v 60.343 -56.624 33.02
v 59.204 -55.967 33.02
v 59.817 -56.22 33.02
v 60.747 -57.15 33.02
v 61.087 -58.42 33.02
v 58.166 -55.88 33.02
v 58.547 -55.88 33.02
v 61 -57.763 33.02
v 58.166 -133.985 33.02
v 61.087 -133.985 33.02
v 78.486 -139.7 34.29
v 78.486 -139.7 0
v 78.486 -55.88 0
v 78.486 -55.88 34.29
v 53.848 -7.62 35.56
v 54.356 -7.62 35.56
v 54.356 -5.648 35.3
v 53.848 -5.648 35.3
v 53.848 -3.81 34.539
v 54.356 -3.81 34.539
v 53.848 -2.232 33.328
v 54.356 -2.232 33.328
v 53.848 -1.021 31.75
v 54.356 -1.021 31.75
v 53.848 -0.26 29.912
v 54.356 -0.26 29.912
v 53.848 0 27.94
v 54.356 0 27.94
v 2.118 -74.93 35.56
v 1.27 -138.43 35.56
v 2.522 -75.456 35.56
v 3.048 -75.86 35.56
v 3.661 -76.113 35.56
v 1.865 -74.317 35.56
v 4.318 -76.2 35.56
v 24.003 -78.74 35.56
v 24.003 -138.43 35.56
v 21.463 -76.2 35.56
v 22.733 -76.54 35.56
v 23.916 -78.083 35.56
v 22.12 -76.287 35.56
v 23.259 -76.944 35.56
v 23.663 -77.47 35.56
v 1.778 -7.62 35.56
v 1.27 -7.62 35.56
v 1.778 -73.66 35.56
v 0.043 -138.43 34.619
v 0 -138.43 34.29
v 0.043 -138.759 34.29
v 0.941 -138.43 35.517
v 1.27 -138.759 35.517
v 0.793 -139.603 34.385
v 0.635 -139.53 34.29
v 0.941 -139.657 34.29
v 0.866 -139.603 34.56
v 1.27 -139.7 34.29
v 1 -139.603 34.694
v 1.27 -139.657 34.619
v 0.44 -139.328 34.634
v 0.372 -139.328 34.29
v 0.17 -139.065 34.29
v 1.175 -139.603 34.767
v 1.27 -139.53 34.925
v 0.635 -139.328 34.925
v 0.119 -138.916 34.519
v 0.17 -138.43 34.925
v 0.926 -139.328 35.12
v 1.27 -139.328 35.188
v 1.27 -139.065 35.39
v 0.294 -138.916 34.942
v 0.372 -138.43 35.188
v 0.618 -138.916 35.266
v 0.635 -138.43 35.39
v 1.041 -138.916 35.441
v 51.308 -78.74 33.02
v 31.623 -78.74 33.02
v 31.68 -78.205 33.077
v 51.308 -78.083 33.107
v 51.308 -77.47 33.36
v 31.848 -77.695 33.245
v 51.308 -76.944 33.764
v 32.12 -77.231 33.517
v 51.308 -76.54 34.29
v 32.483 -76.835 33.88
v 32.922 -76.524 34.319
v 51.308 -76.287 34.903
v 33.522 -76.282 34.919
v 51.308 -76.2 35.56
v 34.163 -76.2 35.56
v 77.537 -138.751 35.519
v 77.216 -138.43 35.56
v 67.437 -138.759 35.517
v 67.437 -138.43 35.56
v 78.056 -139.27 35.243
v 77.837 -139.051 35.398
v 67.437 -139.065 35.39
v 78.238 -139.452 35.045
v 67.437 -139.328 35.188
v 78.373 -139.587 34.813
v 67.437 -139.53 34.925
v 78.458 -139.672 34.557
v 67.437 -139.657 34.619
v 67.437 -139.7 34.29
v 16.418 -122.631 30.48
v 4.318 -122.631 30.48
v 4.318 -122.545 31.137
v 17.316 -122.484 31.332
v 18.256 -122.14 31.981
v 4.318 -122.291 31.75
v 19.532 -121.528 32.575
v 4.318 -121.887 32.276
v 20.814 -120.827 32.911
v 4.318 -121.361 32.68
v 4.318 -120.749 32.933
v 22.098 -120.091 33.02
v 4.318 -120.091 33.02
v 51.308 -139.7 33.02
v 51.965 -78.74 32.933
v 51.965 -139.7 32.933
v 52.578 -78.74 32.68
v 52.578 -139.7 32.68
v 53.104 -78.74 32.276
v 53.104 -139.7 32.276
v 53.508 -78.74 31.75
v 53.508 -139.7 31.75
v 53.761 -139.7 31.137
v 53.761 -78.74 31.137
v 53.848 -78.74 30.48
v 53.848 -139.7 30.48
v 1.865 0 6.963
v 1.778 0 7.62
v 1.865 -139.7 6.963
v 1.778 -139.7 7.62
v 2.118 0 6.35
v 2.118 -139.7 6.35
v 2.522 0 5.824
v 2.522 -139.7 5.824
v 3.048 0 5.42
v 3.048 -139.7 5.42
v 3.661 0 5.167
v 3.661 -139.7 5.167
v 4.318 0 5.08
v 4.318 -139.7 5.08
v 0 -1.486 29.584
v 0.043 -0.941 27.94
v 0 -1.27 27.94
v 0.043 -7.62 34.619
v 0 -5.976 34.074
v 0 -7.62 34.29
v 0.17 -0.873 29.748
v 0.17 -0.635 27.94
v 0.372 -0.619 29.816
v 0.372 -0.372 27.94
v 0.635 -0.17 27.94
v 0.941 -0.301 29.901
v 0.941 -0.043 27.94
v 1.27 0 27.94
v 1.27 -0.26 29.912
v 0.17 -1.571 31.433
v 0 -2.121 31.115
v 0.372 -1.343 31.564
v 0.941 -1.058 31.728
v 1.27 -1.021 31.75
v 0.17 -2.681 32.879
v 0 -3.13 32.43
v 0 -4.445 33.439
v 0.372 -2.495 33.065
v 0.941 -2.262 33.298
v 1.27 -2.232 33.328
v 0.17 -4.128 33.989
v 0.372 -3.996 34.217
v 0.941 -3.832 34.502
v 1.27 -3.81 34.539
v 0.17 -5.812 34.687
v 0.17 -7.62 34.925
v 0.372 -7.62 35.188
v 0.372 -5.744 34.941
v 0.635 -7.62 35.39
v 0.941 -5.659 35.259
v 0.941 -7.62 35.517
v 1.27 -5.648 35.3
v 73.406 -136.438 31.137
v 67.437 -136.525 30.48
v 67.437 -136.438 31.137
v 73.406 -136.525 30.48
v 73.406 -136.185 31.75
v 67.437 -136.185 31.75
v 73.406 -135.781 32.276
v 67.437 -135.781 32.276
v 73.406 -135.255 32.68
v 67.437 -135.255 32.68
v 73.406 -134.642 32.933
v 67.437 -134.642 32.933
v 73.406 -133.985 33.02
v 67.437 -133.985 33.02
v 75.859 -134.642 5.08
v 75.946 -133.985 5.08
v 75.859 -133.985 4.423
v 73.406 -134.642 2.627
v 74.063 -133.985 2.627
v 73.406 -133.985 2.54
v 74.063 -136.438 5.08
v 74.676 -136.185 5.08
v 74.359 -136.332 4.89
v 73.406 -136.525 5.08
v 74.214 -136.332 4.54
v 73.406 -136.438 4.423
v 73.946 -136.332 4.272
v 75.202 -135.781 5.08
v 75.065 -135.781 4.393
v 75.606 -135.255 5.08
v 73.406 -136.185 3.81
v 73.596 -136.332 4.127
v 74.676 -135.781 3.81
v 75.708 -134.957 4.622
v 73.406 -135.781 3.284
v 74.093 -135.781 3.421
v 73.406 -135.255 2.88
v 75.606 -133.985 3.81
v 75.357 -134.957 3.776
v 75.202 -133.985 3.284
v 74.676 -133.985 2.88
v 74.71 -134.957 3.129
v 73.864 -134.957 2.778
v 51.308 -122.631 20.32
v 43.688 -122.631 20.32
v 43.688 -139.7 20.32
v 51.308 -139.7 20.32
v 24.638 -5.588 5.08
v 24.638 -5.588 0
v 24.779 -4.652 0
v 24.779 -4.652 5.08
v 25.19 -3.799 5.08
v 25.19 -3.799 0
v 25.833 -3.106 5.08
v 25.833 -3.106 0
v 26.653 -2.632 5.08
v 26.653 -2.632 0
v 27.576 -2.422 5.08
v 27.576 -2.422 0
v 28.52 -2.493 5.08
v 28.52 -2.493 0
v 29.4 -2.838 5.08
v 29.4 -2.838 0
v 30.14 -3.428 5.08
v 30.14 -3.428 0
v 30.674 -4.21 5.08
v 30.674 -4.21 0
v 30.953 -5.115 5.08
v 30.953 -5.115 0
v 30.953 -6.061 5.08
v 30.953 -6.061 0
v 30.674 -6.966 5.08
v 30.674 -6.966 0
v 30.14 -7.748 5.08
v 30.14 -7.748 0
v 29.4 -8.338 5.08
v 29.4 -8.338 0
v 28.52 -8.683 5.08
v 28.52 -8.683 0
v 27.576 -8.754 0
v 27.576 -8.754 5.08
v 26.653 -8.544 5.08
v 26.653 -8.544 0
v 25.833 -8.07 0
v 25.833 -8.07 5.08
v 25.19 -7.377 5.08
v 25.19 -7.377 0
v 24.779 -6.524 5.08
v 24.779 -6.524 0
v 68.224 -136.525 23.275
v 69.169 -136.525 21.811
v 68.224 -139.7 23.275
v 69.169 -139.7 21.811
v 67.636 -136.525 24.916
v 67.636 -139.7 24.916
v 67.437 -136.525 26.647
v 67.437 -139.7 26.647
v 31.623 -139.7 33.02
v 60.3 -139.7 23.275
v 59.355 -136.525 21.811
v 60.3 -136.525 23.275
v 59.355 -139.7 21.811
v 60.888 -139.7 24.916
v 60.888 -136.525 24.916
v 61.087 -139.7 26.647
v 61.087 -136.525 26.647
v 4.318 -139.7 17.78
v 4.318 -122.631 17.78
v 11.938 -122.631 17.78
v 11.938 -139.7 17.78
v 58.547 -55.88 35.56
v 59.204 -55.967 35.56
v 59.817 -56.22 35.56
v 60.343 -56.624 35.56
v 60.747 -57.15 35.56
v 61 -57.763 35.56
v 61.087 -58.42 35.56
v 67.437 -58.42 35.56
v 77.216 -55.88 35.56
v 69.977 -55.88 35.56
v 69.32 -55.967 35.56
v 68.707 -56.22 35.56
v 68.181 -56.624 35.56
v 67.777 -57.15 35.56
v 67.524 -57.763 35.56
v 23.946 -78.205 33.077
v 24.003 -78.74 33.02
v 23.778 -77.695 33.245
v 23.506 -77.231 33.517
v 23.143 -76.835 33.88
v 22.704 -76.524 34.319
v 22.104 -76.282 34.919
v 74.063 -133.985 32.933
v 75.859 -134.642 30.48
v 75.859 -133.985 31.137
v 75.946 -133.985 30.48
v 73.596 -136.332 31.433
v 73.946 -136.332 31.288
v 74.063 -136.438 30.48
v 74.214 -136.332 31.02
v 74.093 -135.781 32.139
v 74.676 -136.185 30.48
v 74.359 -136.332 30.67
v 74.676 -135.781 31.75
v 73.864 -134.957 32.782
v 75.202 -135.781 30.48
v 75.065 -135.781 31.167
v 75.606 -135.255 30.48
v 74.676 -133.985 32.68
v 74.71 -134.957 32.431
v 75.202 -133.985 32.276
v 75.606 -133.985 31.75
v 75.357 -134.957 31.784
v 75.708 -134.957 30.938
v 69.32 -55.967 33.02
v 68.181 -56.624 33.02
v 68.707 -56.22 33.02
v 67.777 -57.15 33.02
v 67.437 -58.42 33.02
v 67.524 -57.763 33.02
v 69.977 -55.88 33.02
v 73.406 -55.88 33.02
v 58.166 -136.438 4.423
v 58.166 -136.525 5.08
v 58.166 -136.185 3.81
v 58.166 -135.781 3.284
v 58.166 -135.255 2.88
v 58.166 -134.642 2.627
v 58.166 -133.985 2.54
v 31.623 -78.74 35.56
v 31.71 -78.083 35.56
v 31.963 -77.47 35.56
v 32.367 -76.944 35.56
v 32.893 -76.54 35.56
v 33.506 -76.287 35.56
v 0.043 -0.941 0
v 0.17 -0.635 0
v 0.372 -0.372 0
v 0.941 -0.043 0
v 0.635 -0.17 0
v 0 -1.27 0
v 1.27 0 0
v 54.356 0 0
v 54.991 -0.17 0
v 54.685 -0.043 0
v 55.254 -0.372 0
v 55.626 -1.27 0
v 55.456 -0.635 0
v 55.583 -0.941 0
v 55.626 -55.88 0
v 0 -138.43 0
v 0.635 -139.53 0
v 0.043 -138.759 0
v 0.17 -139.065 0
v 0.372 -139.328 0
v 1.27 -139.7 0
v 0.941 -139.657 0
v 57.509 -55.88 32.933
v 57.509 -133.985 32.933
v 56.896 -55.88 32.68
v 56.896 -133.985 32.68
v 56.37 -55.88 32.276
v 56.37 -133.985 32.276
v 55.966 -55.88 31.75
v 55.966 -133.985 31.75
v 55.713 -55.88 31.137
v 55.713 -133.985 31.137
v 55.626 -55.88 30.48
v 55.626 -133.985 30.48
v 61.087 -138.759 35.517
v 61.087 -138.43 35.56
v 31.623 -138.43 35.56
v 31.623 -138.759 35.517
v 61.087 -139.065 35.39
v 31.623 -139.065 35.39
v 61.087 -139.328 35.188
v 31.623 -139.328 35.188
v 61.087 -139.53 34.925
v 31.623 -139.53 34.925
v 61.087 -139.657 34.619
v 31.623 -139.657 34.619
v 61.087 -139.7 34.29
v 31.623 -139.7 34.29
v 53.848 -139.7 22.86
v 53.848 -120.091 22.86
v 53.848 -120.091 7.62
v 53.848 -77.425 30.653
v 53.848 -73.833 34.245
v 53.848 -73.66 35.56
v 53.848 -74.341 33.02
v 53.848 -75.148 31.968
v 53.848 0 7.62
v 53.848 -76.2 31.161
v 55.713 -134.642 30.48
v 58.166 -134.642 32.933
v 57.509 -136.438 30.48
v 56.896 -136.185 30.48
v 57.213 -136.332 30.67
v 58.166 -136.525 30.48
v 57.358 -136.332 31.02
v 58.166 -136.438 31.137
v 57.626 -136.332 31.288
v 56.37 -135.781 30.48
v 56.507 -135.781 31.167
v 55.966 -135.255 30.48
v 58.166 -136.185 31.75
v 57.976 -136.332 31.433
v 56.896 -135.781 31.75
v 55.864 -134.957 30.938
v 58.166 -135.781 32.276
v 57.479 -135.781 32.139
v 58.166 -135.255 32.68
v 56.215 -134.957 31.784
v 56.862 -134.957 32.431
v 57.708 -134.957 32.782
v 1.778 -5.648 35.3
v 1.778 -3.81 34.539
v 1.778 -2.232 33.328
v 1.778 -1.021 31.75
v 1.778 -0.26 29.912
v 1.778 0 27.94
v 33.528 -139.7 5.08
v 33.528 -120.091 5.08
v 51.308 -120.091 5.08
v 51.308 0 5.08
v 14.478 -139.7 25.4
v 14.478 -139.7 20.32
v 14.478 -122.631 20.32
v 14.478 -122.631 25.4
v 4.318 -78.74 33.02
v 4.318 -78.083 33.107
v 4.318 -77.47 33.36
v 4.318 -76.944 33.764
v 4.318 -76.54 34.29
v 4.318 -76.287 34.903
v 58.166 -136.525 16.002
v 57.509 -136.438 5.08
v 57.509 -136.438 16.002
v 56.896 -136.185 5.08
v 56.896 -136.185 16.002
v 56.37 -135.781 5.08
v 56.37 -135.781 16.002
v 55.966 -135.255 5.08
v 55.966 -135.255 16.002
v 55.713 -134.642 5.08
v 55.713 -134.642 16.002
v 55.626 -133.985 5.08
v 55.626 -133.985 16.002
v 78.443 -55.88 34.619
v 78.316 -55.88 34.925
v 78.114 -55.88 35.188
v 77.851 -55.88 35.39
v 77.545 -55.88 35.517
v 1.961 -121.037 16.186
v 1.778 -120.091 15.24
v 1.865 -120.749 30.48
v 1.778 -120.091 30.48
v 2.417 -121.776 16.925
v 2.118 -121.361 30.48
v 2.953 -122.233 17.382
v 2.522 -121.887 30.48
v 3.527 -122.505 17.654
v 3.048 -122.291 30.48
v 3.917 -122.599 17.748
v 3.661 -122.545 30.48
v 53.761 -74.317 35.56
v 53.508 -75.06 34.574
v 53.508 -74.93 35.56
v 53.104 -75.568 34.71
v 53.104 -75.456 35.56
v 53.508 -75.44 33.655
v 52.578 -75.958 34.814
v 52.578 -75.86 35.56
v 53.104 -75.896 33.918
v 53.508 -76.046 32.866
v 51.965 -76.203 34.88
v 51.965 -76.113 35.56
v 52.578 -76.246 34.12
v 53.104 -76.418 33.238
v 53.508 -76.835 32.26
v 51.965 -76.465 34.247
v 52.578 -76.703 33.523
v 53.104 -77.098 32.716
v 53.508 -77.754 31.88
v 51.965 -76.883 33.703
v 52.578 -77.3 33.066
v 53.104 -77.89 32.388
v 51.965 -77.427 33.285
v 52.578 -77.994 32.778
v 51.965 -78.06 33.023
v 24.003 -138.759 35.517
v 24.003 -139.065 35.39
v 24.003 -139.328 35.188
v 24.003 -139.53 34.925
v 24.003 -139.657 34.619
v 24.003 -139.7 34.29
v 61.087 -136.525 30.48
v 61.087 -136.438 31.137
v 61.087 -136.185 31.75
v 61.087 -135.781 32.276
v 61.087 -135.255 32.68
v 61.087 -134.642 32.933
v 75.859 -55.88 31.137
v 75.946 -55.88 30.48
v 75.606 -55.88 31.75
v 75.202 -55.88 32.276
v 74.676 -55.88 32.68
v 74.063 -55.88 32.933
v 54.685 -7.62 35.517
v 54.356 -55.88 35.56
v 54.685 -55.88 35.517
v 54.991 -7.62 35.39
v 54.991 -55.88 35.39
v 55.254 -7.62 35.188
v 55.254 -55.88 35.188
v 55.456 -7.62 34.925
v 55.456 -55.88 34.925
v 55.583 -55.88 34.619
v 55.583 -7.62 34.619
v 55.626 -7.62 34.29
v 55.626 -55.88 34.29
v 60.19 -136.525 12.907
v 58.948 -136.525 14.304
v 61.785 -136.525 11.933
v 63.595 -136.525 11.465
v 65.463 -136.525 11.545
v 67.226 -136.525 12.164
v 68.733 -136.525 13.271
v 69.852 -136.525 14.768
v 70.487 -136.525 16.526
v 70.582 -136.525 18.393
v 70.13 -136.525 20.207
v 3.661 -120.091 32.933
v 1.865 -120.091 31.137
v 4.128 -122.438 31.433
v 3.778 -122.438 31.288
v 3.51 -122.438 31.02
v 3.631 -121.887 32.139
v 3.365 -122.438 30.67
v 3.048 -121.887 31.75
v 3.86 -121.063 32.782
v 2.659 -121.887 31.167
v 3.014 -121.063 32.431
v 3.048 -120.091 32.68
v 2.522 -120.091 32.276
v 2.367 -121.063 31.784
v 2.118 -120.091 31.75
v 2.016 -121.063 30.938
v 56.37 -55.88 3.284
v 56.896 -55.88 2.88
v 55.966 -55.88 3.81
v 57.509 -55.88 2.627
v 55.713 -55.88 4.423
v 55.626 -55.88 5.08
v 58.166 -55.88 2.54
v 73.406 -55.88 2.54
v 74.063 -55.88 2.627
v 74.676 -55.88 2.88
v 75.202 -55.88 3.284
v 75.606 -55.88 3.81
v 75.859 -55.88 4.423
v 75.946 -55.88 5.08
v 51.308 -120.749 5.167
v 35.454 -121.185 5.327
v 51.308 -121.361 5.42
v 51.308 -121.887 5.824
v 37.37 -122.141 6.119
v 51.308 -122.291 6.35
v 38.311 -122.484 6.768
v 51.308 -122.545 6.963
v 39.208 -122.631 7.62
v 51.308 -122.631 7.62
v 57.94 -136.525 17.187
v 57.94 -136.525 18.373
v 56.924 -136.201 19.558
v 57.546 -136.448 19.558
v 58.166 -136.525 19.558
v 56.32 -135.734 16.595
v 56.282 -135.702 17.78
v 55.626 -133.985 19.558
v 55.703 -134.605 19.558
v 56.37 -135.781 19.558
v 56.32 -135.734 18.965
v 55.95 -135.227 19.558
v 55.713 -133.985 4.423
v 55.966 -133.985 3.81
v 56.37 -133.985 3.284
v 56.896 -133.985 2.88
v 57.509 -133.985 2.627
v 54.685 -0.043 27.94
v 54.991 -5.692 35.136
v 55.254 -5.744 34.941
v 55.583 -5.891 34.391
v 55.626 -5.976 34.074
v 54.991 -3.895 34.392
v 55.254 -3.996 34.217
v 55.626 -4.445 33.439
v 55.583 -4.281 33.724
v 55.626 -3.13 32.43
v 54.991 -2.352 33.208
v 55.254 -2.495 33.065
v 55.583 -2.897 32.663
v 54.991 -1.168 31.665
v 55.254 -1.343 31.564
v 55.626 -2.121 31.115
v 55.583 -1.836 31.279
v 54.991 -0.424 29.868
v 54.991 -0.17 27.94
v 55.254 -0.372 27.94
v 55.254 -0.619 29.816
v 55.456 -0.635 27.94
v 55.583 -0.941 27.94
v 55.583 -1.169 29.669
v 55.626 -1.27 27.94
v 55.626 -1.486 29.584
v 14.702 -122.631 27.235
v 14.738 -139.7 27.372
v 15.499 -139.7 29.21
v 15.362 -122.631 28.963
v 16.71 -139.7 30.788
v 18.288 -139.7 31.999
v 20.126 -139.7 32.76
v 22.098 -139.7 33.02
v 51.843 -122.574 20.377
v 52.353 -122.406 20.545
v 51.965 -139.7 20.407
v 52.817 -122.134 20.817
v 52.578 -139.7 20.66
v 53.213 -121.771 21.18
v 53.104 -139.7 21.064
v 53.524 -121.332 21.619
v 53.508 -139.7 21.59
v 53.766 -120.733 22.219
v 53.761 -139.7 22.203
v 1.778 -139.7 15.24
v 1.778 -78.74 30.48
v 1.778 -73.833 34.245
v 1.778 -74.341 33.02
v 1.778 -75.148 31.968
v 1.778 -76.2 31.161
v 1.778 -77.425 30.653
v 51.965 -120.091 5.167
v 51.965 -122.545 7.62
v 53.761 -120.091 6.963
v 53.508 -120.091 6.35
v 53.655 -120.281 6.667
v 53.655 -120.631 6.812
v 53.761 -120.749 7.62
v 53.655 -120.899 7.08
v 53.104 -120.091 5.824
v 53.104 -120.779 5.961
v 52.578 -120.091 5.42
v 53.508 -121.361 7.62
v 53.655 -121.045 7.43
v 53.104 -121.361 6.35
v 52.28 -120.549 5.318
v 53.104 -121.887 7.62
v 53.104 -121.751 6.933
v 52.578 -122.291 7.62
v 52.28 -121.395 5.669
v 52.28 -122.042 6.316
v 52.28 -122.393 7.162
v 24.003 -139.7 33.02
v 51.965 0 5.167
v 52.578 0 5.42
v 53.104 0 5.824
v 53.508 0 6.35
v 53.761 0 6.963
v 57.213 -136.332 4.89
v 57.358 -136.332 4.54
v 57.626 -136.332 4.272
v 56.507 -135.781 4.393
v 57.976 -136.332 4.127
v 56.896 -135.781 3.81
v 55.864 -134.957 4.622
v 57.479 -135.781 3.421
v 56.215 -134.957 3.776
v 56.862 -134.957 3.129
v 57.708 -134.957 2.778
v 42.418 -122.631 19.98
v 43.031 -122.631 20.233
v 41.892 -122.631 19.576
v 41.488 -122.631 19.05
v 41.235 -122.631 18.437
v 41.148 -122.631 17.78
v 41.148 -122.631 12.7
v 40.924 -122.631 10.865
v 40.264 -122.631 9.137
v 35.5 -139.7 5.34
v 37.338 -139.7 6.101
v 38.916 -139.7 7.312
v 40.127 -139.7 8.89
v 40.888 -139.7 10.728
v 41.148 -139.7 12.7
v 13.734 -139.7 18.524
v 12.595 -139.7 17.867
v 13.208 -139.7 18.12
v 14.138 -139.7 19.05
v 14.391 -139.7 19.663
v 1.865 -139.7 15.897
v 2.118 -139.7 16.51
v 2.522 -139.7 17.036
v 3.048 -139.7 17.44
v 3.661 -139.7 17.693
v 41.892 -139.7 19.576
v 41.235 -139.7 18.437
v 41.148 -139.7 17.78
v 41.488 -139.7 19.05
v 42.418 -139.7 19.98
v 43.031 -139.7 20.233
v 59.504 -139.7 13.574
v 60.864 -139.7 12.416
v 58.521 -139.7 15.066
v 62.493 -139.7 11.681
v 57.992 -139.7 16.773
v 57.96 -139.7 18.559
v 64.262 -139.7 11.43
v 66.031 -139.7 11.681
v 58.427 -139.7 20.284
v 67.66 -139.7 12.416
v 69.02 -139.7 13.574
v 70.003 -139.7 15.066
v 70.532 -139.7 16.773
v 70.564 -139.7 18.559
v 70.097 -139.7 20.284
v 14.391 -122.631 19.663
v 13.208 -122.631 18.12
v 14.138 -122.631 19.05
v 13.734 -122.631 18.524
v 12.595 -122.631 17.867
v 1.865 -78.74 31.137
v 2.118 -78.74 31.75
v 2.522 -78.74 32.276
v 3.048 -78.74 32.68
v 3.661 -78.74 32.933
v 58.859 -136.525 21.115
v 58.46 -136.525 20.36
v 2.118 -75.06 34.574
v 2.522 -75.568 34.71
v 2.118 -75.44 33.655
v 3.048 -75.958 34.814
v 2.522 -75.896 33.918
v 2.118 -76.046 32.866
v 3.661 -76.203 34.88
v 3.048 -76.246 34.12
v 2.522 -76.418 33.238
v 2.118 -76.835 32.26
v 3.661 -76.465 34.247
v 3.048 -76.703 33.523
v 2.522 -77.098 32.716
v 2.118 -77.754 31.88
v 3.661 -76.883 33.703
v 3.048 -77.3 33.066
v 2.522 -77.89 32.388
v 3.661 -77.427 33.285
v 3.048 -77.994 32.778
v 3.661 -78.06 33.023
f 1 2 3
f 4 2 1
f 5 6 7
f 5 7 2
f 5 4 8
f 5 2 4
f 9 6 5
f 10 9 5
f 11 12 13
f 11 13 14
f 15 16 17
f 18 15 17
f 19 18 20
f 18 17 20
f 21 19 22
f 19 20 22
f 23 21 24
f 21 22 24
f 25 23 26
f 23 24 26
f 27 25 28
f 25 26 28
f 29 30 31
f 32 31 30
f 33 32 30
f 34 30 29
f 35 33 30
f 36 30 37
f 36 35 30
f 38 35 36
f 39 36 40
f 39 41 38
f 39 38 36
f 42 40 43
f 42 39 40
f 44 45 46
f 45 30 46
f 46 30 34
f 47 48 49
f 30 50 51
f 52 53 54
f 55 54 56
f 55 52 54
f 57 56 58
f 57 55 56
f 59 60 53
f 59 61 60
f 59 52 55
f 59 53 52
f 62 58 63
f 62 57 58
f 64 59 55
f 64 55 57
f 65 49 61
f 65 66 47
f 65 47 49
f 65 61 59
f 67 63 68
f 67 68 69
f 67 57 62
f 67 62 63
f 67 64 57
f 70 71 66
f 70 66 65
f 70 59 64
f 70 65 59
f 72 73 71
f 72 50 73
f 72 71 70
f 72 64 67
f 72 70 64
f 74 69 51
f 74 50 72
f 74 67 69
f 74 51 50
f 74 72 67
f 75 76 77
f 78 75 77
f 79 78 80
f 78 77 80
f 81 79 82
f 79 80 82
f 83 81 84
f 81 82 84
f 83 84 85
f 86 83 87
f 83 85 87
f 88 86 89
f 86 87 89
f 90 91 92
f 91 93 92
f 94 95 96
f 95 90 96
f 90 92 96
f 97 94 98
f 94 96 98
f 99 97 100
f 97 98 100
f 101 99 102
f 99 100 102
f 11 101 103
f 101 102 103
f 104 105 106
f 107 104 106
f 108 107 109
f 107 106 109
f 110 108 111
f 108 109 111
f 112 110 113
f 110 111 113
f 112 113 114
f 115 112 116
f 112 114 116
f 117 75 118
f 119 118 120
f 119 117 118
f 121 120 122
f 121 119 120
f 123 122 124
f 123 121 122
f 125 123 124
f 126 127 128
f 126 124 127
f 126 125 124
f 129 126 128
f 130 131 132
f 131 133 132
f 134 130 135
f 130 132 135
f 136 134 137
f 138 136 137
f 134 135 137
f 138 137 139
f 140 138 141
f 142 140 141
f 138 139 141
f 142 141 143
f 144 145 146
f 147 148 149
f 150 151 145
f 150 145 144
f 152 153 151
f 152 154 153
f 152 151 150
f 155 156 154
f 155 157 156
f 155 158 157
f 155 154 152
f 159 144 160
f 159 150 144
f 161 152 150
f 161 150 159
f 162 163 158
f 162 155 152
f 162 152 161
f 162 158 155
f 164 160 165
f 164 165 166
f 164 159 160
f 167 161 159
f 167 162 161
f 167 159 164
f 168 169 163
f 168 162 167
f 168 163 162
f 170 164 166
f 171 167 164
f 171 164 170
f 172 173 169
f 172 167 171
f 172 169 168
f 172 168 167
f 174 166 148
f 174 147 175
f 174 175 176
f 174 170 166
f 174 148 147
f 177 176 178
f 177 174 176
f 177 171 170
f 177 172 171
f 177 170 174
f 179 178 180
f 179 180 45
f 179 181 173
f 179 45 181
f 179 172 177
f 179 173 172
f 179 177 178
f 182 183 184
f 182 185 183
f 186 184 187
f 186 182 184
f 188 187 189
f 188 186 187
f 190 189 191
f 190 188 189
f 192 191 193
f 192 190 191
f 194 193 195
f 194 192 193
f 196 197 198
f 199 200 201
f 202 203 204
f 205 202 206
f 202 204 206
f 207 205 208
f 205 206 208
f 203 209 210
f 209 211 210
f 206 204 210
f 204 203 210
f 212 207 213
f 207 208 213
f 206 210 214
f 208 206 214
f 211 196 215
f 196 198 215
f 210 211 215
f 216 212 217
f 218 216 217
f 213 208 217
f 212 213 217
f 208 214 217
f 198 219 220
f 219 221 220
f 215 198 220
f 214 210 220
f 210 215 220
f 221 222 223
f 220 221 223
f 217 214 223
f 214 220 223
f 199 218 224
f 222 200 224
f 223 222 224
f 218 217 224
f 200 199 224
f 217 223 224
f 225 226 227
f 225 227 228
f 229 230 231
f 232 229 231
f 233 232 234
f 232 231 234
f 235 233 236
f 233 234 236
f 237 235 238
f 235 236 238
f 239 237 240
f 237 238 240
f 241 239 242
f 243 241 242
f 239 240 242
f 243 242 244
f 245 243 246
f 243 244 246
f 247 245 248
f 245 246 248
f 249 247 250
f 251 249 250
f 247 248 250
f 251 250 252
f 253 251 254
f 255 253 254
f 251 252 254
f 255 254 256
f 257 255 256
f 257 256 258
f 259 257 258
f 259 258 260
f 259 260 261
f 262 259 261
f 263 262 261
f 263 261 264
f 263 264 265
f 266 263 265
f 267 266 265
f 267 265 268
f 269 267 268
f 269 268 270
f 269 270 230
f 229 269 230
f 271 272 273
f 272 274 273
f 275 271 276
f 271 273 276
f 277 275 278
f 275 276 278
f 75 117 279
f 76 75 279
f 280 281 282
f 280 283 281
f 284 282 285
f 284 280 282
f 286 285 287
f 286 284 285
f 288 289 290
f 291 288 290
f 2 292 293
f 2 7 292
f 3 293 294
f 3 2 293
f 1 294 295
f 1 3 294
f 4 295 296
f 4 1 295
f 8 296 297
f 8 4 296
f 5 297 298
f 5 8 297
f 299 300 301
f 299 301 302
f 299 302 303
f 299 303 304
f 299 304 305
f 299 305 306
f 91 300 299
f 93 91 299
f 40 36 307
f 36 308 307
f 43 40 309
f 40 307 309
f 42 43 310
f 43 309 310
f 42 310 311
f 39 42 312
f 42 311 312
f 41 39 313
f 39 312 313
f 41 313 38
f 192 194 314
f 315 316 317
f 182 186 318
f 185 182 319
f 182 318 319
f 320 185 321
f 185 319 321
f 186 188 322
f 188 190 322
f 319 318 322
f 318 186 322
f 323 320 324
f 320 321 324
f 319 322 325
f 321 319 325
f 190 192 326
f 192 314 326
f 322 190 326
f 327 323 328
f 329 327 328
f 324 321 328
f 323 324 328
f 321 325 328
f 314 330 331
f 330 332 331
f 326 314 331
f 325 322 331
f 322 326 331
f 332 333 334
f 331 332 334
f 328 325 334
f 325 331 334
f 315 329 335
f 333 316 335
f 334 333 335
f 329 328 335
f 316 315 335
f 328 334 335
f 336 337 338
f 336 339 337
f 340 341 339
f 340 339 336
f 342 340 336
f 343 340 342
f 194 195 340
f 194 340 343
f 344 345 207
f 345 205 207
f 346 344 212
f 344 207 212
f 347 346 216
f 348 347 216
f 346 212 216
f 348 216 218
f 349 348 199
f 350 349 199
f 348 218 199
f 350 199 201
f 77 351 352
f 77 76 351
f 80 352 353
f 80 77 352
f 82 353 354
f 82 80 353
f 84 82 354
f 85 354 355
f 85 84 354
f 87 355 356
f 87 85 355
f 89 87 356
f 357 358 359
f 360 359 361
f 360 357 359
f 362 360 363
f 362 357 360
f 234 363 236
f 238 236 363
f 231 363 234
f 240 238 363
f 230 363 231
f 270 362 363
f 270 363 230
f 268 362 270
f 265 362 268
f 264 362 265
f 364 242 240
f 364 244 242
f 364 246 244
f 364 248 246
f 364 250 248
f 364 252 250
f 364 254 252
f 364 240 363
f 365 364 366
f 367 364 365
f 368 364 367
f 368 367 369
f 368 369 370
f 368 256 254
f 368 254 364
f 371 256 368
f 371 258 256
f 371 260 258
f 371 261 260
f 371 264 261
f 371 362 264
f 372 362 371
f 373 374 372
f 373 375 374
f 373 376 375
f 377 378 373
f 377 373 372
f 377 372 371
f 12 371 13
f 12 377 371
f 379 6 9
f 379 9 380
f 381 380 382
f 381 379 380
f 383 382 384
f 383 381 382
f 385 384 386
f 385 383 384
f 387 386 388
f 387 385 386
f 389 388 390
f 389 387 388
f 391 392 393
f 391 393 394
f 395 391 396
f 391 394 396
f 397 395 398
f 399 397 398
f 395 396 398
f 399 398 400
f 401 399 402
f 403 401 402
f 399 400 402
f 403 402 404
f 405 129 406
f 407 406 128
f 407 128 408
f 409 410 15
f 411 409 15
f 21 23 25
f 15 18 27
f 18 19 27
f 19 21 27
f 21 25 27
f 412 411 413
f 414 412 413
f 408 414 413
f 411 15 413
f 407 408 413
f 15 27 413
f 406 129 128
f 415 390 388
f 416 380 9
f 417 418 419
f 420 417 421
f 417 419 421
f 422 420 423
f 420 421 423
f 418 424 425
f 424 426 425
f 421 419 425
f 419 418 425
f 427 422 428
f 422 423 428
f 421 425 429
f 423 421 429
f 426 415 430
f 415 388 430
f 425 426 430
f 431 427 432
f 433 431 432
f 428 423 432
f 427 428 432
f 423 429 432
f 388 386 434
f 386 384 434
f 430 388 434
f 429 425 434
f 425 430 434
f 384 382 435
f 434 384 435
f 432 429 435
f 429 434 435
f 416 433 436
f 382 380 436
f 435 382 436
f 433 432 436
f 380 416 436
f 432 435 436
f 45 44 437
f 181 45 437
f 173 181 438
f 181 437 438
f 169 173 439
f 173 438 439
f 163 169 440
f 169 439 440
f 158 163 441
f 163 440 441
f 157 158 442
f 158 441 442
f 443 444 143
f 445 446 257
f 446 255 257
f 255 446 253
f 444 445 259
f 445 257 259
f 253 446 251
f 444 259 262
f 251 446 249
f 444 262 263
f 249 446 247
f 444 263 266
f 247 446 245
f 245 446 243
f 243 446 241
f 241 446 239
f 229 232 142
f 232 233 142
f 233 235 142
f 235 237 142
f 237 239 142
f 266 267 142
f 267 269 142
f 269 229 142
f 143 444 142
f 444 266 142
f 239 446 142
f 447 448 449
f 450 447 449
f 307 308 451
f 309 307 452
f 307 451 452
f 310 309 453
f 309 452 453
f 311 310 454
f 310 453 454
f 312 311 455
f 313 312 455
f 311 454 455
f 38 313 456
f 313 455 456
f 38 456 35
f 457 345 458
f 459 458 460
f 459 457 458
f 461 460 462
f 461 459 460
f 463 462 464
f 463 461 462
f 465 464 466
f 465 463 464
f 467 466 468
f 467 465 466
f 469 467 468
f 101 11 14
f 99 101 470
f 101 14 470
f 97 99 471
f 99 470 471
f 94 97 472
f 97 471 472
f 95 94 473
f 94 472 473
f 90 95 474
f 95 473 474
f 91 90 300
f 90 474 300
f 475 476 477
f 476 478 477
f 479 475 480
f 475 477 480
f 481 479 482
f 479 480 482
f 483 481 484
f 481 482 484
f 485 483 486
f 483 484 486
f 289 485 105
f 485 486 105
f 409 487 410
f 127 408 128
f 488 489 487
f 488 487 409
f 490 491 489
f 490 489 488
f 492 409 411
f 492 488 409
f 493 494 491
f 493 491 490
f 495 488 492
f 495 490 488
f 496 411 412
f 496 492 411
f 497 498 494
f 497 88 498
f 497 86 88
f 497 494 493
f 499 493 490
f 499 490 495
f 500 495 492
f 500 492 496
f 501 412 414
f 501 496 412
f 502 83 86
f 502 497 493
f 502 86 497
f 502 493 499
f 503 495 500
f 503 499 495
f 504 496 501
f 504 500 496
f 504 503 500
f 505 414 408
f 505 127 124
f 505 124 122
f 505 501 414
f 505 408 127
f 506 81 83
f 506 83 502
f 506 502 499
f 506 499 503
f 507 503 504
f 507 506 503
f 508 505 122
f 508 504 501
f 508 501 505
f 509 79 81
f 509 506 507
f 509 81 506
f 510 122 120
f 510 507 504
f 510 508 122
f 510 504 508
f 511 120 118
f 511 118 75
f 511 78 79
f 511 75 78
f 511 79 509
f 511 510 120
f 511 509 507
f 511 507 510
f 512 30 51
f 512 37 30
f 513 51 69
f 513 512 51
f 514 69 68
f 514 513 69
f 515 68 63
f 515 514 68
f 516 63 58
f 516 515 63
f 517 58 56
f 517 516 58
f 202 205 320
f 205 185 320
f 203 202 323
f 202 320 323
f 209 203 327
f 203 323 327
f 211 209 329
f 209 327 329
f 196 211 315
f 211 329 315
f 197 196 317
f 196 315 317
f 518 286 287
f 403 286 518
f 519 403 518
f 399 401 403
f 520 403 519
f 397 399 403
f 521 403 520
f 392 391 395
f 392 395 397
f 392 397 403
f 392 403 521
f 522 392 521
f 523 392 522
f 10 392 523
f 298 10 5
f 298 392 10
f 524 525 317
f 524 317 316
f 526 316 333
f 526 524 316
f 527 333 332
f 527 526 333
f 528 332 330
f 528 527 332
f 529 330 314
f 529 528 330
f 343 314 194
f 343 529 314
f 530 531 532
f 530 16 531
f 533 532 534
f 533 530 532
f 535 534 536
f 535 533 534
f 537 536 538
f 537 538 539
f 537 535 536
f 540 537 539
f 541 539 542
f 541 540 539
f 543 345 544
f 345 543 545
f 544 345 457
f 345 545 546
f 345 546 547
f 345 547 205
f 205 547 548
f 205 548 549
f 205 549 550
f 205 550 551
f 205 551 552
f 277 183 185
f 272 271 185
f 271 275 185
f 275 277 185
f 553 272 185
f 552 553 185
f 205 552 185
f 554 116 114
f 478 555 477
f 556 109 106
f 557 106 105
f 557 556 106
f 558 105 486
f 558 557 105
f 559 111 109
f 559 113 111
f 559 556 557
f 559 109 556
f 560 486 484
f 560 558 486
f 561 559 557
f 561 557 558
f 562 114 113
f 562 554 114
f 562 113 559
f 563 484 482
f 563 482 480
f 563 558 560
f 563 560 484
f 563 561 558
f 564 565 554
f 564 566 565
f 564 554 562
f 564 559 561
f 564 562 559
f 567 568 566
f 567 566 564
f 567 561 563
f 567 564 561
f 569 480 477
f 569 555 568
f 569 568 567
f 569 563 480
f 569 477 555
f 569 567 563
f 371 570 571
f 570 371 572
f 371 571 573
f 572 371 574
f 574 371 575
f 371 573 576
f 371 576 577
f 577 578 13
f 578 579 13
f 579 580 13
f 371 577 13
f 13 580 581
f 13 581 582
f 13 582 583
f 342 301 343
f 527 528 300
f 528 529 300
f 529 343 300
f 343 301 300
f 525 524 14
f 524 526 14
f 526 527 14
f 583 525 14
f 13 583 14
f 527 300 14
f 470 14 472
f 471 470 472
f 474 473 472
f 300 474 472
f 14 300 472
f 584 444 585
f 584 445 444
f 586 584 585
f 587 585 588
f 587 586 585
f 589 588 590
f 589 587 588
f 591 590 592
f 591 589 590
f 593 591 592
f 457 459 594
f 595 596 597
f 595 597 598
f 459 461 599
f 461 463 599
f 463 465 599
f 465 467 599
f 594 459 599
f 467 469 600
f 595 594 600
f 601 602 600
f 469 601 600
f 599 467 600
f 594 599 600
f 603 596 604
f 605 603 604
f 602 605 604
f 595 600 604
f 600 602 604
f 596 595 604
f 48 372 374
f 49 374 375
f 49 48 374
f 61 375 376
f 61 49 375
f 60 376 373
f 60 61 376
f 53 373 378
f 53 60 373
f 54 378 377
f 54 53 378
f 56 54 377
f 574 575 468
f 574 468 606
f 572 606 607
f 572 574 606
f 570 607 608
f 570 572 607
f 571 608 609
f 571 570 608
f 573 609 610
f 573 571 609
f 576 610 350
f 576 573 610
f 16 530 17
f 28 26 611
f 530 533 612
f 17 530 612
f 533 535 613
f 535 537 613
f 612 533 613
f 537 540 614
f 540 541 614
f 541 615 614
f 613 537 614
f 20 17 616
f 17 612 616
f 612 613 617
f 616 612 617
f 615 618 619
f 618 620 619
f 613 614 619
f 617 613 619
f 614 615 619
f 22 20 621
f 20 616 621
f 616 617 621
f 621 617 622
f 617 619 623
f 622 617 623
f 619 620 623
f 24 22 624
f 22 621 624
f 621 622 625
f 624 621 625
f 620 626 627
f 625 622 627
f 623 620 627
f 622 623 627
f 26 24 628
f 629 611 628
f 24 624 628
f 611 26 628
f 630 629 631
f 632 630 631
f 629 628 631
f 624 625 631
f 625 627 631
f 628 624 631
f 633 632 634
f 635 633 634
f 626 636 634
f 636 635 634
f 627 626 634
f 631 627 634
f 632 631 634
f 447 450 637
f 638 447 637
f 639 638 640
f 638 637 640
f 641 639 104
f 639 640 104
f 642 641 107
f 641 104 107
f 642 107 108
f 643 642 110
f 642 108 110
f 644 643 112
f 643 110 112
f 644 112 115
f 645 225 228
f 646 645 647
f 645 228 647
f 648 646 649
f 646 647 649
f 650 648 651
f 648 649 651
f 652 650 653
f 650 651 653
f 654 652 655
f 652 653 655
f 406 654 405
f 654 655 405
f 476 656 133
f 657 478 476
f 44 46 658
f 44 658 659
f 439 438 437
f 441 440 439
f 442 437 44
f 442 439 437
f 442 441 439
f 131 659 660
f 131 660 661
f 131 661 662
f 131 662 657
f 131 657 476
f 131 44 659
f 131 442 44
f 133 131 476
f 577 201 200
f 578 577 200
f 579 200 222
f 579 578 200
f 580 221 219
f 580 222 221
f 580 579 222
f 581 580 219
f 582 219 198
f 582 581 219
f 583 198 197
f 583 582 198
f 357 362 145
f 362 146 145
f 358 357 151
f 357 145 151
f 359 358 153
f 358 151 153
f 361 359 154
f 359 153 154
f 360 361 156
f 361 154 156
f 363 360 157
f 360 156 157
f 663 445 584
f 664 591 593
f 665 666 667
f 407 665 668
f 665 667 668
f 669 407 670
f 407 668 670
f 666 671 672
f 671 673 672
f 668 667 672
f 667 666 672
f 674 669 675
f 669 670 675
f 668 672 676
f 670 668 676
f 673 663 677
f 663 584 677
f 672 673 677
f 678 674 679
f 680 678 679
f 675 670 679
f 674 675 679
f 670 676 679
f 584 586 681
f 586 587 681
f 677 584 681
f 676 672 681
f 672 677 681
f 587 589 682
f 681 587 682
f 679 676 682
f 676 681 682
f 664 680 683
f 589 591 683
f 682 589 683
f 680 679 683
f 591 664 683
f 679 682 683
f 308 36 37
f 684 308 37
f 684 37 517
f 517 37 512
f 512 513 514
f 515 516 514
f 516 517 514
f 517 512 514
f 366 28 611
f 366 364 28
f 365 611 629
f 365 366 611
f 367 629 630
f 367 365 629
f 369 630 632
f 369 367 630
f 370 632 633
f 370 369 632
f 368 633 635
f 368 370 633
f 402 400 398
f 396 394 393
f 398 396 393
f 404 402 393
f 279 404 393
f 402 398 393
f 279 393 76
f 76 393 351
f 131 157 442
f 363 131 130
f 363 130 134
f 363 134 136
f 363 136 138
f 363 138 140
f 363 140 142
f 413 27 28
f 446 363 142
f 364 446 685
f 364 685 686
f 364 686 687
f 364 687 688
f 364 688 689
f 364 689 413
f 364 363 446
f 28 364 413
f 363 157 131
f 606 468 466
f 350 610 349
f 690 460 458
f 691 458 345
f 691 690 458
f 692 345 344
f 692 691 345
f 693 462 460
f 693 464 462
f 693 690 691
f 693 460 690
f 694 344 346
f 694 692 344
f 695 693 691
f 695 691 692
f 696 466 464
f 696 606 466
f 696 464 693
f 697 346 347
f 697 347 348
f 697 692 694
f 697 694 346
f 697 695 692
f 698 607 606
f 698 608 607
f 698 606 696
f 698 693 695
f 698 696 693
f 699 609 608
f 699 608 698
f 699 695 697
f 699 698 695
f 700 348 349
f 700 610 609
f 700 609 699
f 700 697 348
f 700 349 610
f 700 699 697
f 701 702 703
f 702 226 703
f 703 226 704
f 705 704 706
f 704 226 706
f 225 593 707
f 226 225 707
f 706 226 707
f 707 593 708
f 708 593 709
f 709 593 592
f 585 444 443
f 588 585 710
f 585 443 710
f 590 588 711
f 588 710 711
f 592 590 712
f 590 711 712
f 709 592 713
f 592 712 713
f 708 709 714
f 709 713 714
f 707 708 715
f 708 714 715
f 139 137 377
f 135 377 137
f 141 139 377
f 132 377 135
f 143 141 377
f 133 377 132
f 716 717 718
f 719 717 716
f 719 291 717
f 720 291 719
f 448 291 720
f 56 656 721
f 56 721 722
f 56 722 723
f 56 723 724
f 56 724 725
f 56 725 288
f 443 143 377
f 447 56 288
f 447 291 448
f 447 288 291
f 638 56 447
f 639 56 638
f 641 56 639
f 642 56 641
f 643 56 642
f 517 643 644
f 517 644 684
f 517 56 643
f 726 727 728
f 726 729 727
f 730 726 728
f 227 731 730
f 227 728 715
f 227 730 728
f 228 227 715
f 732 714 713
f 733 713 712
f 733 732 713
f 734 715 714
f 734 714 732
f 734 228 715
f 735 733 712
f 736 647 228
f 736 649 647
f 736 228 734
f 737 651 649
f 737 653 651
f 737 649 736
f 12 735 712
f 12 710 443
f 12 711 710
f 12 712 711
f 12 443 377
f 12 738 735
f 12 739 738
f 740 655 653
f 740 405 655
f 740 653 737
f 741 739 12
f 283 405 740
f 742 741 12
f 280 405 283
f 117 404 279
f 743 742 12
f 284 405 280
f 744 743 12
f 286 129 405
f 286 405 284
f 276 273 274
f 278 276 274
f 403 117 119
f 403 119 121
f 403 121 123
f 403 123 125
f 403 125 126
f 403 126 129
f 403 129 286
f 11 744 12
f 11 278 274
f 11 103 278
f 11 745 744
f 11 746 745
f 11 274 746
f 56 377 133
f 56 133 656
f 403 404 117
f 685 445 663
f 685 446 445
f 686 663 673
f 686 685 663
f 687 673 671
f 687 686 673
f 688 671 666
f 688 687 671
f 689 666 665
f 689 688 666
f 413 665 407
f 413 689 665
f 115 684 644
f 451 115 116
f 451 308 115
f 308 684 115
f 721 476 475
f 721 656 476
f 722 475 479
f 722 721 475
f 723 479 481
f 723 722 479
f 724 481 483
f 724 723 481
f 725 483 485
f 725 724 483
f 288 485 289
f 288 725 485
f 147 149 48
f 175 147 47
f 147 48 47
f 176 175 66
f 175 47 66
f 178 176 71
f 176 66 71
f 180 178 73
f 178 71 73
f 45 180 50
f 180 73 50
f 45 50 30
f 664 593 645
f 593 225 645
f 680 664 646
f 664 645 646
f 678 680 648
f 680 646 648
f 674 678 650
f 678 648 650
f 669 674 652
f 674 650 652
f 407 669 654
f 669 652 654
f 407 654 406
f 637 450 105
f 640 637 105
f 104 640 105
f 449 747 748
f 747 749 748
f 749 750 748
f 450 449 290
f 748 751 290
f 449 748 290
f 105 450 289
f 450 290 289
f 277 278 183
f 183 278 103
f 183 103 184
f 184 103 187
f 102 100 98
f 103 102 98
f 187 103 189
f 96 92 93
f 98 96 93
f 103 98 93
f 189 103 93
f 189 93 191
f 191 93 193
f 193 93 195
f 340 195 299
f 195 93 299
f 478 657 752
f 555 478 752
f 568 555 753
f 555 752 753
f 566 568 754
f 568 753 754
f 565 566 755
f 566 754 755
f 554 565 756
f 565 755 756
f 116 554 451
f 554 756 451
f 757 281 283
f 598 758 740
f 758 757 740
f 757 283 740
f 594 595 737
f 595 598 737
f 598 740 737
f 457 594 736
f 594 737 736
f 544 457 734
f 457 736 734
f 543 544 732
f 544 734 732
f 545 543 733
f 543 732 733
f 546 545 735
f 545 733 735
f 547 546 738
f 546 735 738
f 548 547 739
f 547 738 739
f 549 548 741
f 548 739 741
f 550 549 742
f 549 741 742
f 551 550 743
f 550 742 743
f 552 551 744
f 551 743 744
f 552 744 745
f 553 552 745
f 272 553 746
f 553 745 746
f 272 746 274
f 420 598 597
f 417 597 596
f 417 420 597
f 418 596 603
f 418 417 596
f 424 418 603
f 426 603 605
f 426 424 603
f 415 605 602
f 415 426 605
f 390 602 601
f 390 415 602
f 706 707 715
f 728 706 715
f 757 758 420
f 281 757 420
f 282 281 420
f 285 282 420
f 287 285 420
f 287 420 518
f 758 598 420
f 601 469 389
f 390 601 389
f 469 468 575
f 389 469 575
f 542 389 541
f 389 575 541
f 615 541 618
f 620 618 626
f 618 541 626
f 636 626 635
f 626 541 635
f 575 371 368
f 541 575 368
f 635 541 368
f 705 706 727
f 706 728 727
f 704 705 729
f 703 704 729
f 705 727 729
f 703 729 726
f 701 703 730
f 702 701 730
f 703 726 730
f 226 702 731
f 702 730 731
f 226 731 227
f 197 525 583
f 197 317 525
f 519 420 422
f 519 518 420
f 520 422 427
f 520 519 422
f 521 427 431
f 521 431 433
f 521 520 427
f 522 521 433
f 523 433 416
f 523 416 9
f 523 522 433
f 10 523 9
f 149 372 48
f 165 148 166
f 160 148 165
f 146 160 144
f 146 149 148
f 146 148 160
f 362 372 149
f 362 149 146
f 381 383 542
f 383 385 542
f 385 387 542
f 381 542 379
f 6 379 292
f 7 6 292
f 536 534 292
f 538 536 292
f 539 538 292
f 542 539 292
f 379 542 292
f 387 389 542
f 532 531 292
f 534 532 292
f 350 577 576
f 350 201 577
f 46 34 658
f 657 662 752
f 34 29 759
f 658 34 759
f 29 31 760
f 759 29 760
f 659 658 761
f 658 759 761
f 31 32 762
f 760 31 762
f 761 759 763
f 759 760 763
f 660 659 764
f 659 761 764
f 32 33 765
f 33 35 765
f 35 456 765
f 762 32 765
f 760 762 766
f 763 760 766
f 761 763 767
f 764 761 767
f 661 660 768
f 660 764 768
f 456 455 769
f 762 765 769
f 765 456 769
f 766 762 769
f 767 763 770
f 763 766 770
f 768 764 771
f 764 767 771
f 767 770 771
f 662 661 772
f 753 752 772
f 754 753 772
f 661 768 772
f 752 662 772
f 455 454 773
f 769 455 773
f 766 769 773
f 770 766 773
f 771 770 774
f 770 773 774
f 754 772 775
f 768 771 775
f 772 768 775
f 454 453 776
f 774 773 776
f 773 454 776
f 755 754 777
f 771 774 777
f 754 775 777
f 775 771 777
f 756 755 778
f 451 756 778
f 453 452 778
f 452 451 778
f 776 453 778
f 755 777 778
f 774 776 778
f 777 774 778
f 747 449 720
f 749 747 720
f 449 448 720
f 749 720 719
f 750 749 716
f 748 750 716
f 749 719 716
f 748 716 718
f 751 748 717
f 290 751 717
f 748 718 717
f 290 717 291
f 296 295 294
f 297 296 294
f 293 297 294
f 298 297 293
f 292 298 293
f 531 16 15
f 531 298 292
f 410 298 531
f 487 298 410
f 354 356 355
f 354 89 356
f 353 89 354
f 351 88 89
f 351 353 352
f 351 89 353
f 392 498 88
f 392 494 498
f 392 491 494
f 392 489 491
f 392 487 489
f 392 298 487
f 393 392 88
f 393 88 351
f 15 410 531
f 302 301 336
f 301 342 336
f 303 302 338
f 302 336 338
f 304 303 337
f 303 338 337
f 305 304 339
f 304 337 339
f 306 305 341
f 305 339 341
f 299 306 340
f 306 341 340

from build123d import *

# Parameters (mm, degrees)
SKETCH1_W           = 55.626
SKETCH1_H           = 139.7
BOSS_EXTRUDE1_DEPTH = 35.56
CUT_EXTRUDE1_DEPTH  = 27.94
CUT_EXTRUDE6_DEPTH  = 30.48
SKETCH4_R           = 3.175
CUT_EXTRUDE7_DEPTH  = 155.514903734
SKETCH5_W           = 12.7
SKETCH5_H           = 12.7
CUT_EXTRUDE8_DEPTH  = 140.273747309
BOSS_EXTRUDE2_DEPTH = 83.82
SKETCH7_W           = 20.32
SKETCH7_H           = 30.48
SKETCH7_R           = 6.35
BOSS_EXTRUDE3_DEPTH = 3.175
SKETCH8_W           = 6.35
SKETCH8_H           = 83.82
CUT_EXTRUDE9_DEPTH  = 17.78
FILLET1_R           = 7.62
FILLET2_R           = 2.54
FILLET3_R           = 1.27


with BuildPart() as part:
    # Sketch1 → Boss-Extrude1 (new body)
    with BuildSketch(Plane.XY):
        with Locations((27.813, -69.85)):
            Rectangle(SKETCH1_W, SKETCH1_H)
    extrude(amount=BOSS_EXTRUDE1_DEPTH)

    # Sketch2 → Cut-Extrude1 (cut)
    with BuildSketch(Plane(origin=(0, 0, 5.08), x_dir=(-1, 0, 0), z_dir=(0, 0, -1))):
        Polygon((-1.778, -33.02), (-53.848, -33.02), (-53.848, -122.6312), (-41.148, -122.6312), (-41.148, -139.7), (-14.478, -139.7), (-14.478, -122.6312), (-1.778, -122.6312), align=None)
    extrude(amount=-CUT_EXTRUDE1_DEPTH, mode=Mode.SUBTRACT)

    # Sketch3 → Cut-Extrude6 (cut)
    with BuildSketch(Plane.XY.offset(35.56)):
        Polygon((24.003, -139.7), (31.623, -139.7), (31.623, -76.2), (53.848, -76.2), (53.848, 0), (1.778, 0), (1.778, -76.2), (24.003, -76.2), align=None)
    extrude(amount=-CUT_EXTRUDE6_DEPTH, mode=Mode.SUBTRACT)

    # Sketch4 → Cut-Extrude7 (cut, through all)
    with BuildSketch(Plane(origin=(0, 0, 0), x_dir=(-1, 0, 0), z_dir=(0, 0, -1))):
        with Locations((-27.813, -5.588)):
            Circle(SKETCH4_R)
    extrude(amount=-CUT_EXTRUDE7_DEPTH, mode=Mode.SUBTRACT)

    # Sketch5 → Cut-Extrude8 (cut, through all)
    with BuildSketch(Plane(origin=(0, -122.6312, 0), x_dir=(1, 0, 0), z_dir=(0, 1, 0))):
        with Locations((8.128, -11.43)):
            Rectangle(SKETCH5_W, SKETCH5_H)
        with Locations((47.498, -26.67)):
            Rectangle(SKETCH5_W, SKETCH5_H)
    extrude(amount=-CUT_EXTRUDE8_DEPTH, mode=Mode.SUBTRACT)

    # Sketch6 → Boss-Extrude2 (add)
    with BuildSketch(Plane.XZ.offset(139.7)):
        Polygon((55.626, 0), (78.486, 0), (78.486, 35.56), (55.626, 35.56), (55.626, 33.02), (75.946, 33.02), (75.946, 2.54), (55.626, 2.54), align=None)
    extrude(amount=-BOSS_EXTRUDE2_DEPTH)

    # Sketch7 → Boss-Extrude3 (add)
    with BuildSketch(Plane.XZ.offset(139.7)):
        with Locations((65.786, 17.78)):
            Rectangle(SKETCH7_W, SKETCH7_H)
        with Locations(Location((64.262, 17.78, 0), (0, 0, 270))):
            Circle(SKETCH7_R, mode=Mode.SUBTRACT)
    extrude(amount=-BOSS_EXTRUDE3_DEPTH)

    # Sketch8 → Cut-Extrude9 (cut)
    with BuildSketch(Plane.XY.offset(35.56)):
        with Locations((64.262, -97.79)):
            Rectangle(SKETCH8_W, SKETCH8_H)
    extrude(amount=-CUT_EXTRUDE9_DEPTH, mode=Mode.SUBTRACT)

    # Fillet1
    fillet1_edges = [part.edges().sort_by_distance(p)[0] for p in [
        (67.437, -138.1125, 23.279261314),
        (61.087, -138.1125, 23.279261314),
        (54.737, 0, 35.56),
        (14.478, -131.1656, 33.02),
        (41.148, -131.1656, 5.08),
        (0.889, 0, 35.56),
    ]]
    fillet(fillet1_edges, radius=FILLET1_R)

    # Fillet2
    fillet2_edges = [part.edges().sort_by_distance(p)[0] for p in [
        (53.848, -131.1656, 20.32),
        (41.148, -131.1656, 20.32),
        (55.626, -96.2025, 2.54),
        (75.946, -96.2025, 2.54),
        (75.946, -96.2025, 33.02),
        (55.626, -96.2025, 33.02),
        (55.626, -136.525, 17.78),
        (71.6915, -136.525, 33.02),
        (75.946, -136.525, 17.78),
        (65.786, -136.525, 2.54),
        (58.3565, -136.525, 33.02),
        (61.087, -55.88, 34.29),
        (67.437, -55.88, 34.29),
        (1.778, -99.4156, 33.02),
        (11.938, -122.6312, 33.02),
        (1.778, -122.6312, 25.4),
        (43.688, -122.6312, 5.08),
        (1.778, -69.85, 5.08),
        (53.848, -61.3156, 5.08),
        (53.848, -107.95, 33.02),
        (12.8905, -76.2, 33.02),
        (1.778, -76.2, 34.29),
        (42.7355, -76.2, 33.02),
        (24.003, -76.2, 34.29),
        (53.848, -76.2, 34.29),
        (31.623, -76.2, 34.29),
        (53.848, -122.6312, 12.7),
        (1.778, -131.1656, 17.78),
        (14.478, -131.1656, 17.78),
    ]]
    fillet(fillet2_edges, radius=FILLET2_R - 0.0001)  # a hair under: the kernel refuses the full size

    # Fillet3
    fillet3_edges = [part.edges().sort_by_distance(p)[0] for p in [
        (55.626, -31.75, 35.56),
        (78.486, -97.79, 35.56),
        (72.9615, -139.7, 35.56),
        (55.626, 0, 13.97),
        (0, 0, 13.97),
        (55.626, -2.231846327, 33.328153673),
        (0, -73.66, 35.56),
        (0, -2.231846327, 33.328153673),
        (46.355, -139.7, 35.56),
        (0, -139.7, 17.78),
        (12.0015, -139.7, 35.56),
    ]]
    fillet(fillet3_edges, radius=FILLET3_R)


solid = part.part
